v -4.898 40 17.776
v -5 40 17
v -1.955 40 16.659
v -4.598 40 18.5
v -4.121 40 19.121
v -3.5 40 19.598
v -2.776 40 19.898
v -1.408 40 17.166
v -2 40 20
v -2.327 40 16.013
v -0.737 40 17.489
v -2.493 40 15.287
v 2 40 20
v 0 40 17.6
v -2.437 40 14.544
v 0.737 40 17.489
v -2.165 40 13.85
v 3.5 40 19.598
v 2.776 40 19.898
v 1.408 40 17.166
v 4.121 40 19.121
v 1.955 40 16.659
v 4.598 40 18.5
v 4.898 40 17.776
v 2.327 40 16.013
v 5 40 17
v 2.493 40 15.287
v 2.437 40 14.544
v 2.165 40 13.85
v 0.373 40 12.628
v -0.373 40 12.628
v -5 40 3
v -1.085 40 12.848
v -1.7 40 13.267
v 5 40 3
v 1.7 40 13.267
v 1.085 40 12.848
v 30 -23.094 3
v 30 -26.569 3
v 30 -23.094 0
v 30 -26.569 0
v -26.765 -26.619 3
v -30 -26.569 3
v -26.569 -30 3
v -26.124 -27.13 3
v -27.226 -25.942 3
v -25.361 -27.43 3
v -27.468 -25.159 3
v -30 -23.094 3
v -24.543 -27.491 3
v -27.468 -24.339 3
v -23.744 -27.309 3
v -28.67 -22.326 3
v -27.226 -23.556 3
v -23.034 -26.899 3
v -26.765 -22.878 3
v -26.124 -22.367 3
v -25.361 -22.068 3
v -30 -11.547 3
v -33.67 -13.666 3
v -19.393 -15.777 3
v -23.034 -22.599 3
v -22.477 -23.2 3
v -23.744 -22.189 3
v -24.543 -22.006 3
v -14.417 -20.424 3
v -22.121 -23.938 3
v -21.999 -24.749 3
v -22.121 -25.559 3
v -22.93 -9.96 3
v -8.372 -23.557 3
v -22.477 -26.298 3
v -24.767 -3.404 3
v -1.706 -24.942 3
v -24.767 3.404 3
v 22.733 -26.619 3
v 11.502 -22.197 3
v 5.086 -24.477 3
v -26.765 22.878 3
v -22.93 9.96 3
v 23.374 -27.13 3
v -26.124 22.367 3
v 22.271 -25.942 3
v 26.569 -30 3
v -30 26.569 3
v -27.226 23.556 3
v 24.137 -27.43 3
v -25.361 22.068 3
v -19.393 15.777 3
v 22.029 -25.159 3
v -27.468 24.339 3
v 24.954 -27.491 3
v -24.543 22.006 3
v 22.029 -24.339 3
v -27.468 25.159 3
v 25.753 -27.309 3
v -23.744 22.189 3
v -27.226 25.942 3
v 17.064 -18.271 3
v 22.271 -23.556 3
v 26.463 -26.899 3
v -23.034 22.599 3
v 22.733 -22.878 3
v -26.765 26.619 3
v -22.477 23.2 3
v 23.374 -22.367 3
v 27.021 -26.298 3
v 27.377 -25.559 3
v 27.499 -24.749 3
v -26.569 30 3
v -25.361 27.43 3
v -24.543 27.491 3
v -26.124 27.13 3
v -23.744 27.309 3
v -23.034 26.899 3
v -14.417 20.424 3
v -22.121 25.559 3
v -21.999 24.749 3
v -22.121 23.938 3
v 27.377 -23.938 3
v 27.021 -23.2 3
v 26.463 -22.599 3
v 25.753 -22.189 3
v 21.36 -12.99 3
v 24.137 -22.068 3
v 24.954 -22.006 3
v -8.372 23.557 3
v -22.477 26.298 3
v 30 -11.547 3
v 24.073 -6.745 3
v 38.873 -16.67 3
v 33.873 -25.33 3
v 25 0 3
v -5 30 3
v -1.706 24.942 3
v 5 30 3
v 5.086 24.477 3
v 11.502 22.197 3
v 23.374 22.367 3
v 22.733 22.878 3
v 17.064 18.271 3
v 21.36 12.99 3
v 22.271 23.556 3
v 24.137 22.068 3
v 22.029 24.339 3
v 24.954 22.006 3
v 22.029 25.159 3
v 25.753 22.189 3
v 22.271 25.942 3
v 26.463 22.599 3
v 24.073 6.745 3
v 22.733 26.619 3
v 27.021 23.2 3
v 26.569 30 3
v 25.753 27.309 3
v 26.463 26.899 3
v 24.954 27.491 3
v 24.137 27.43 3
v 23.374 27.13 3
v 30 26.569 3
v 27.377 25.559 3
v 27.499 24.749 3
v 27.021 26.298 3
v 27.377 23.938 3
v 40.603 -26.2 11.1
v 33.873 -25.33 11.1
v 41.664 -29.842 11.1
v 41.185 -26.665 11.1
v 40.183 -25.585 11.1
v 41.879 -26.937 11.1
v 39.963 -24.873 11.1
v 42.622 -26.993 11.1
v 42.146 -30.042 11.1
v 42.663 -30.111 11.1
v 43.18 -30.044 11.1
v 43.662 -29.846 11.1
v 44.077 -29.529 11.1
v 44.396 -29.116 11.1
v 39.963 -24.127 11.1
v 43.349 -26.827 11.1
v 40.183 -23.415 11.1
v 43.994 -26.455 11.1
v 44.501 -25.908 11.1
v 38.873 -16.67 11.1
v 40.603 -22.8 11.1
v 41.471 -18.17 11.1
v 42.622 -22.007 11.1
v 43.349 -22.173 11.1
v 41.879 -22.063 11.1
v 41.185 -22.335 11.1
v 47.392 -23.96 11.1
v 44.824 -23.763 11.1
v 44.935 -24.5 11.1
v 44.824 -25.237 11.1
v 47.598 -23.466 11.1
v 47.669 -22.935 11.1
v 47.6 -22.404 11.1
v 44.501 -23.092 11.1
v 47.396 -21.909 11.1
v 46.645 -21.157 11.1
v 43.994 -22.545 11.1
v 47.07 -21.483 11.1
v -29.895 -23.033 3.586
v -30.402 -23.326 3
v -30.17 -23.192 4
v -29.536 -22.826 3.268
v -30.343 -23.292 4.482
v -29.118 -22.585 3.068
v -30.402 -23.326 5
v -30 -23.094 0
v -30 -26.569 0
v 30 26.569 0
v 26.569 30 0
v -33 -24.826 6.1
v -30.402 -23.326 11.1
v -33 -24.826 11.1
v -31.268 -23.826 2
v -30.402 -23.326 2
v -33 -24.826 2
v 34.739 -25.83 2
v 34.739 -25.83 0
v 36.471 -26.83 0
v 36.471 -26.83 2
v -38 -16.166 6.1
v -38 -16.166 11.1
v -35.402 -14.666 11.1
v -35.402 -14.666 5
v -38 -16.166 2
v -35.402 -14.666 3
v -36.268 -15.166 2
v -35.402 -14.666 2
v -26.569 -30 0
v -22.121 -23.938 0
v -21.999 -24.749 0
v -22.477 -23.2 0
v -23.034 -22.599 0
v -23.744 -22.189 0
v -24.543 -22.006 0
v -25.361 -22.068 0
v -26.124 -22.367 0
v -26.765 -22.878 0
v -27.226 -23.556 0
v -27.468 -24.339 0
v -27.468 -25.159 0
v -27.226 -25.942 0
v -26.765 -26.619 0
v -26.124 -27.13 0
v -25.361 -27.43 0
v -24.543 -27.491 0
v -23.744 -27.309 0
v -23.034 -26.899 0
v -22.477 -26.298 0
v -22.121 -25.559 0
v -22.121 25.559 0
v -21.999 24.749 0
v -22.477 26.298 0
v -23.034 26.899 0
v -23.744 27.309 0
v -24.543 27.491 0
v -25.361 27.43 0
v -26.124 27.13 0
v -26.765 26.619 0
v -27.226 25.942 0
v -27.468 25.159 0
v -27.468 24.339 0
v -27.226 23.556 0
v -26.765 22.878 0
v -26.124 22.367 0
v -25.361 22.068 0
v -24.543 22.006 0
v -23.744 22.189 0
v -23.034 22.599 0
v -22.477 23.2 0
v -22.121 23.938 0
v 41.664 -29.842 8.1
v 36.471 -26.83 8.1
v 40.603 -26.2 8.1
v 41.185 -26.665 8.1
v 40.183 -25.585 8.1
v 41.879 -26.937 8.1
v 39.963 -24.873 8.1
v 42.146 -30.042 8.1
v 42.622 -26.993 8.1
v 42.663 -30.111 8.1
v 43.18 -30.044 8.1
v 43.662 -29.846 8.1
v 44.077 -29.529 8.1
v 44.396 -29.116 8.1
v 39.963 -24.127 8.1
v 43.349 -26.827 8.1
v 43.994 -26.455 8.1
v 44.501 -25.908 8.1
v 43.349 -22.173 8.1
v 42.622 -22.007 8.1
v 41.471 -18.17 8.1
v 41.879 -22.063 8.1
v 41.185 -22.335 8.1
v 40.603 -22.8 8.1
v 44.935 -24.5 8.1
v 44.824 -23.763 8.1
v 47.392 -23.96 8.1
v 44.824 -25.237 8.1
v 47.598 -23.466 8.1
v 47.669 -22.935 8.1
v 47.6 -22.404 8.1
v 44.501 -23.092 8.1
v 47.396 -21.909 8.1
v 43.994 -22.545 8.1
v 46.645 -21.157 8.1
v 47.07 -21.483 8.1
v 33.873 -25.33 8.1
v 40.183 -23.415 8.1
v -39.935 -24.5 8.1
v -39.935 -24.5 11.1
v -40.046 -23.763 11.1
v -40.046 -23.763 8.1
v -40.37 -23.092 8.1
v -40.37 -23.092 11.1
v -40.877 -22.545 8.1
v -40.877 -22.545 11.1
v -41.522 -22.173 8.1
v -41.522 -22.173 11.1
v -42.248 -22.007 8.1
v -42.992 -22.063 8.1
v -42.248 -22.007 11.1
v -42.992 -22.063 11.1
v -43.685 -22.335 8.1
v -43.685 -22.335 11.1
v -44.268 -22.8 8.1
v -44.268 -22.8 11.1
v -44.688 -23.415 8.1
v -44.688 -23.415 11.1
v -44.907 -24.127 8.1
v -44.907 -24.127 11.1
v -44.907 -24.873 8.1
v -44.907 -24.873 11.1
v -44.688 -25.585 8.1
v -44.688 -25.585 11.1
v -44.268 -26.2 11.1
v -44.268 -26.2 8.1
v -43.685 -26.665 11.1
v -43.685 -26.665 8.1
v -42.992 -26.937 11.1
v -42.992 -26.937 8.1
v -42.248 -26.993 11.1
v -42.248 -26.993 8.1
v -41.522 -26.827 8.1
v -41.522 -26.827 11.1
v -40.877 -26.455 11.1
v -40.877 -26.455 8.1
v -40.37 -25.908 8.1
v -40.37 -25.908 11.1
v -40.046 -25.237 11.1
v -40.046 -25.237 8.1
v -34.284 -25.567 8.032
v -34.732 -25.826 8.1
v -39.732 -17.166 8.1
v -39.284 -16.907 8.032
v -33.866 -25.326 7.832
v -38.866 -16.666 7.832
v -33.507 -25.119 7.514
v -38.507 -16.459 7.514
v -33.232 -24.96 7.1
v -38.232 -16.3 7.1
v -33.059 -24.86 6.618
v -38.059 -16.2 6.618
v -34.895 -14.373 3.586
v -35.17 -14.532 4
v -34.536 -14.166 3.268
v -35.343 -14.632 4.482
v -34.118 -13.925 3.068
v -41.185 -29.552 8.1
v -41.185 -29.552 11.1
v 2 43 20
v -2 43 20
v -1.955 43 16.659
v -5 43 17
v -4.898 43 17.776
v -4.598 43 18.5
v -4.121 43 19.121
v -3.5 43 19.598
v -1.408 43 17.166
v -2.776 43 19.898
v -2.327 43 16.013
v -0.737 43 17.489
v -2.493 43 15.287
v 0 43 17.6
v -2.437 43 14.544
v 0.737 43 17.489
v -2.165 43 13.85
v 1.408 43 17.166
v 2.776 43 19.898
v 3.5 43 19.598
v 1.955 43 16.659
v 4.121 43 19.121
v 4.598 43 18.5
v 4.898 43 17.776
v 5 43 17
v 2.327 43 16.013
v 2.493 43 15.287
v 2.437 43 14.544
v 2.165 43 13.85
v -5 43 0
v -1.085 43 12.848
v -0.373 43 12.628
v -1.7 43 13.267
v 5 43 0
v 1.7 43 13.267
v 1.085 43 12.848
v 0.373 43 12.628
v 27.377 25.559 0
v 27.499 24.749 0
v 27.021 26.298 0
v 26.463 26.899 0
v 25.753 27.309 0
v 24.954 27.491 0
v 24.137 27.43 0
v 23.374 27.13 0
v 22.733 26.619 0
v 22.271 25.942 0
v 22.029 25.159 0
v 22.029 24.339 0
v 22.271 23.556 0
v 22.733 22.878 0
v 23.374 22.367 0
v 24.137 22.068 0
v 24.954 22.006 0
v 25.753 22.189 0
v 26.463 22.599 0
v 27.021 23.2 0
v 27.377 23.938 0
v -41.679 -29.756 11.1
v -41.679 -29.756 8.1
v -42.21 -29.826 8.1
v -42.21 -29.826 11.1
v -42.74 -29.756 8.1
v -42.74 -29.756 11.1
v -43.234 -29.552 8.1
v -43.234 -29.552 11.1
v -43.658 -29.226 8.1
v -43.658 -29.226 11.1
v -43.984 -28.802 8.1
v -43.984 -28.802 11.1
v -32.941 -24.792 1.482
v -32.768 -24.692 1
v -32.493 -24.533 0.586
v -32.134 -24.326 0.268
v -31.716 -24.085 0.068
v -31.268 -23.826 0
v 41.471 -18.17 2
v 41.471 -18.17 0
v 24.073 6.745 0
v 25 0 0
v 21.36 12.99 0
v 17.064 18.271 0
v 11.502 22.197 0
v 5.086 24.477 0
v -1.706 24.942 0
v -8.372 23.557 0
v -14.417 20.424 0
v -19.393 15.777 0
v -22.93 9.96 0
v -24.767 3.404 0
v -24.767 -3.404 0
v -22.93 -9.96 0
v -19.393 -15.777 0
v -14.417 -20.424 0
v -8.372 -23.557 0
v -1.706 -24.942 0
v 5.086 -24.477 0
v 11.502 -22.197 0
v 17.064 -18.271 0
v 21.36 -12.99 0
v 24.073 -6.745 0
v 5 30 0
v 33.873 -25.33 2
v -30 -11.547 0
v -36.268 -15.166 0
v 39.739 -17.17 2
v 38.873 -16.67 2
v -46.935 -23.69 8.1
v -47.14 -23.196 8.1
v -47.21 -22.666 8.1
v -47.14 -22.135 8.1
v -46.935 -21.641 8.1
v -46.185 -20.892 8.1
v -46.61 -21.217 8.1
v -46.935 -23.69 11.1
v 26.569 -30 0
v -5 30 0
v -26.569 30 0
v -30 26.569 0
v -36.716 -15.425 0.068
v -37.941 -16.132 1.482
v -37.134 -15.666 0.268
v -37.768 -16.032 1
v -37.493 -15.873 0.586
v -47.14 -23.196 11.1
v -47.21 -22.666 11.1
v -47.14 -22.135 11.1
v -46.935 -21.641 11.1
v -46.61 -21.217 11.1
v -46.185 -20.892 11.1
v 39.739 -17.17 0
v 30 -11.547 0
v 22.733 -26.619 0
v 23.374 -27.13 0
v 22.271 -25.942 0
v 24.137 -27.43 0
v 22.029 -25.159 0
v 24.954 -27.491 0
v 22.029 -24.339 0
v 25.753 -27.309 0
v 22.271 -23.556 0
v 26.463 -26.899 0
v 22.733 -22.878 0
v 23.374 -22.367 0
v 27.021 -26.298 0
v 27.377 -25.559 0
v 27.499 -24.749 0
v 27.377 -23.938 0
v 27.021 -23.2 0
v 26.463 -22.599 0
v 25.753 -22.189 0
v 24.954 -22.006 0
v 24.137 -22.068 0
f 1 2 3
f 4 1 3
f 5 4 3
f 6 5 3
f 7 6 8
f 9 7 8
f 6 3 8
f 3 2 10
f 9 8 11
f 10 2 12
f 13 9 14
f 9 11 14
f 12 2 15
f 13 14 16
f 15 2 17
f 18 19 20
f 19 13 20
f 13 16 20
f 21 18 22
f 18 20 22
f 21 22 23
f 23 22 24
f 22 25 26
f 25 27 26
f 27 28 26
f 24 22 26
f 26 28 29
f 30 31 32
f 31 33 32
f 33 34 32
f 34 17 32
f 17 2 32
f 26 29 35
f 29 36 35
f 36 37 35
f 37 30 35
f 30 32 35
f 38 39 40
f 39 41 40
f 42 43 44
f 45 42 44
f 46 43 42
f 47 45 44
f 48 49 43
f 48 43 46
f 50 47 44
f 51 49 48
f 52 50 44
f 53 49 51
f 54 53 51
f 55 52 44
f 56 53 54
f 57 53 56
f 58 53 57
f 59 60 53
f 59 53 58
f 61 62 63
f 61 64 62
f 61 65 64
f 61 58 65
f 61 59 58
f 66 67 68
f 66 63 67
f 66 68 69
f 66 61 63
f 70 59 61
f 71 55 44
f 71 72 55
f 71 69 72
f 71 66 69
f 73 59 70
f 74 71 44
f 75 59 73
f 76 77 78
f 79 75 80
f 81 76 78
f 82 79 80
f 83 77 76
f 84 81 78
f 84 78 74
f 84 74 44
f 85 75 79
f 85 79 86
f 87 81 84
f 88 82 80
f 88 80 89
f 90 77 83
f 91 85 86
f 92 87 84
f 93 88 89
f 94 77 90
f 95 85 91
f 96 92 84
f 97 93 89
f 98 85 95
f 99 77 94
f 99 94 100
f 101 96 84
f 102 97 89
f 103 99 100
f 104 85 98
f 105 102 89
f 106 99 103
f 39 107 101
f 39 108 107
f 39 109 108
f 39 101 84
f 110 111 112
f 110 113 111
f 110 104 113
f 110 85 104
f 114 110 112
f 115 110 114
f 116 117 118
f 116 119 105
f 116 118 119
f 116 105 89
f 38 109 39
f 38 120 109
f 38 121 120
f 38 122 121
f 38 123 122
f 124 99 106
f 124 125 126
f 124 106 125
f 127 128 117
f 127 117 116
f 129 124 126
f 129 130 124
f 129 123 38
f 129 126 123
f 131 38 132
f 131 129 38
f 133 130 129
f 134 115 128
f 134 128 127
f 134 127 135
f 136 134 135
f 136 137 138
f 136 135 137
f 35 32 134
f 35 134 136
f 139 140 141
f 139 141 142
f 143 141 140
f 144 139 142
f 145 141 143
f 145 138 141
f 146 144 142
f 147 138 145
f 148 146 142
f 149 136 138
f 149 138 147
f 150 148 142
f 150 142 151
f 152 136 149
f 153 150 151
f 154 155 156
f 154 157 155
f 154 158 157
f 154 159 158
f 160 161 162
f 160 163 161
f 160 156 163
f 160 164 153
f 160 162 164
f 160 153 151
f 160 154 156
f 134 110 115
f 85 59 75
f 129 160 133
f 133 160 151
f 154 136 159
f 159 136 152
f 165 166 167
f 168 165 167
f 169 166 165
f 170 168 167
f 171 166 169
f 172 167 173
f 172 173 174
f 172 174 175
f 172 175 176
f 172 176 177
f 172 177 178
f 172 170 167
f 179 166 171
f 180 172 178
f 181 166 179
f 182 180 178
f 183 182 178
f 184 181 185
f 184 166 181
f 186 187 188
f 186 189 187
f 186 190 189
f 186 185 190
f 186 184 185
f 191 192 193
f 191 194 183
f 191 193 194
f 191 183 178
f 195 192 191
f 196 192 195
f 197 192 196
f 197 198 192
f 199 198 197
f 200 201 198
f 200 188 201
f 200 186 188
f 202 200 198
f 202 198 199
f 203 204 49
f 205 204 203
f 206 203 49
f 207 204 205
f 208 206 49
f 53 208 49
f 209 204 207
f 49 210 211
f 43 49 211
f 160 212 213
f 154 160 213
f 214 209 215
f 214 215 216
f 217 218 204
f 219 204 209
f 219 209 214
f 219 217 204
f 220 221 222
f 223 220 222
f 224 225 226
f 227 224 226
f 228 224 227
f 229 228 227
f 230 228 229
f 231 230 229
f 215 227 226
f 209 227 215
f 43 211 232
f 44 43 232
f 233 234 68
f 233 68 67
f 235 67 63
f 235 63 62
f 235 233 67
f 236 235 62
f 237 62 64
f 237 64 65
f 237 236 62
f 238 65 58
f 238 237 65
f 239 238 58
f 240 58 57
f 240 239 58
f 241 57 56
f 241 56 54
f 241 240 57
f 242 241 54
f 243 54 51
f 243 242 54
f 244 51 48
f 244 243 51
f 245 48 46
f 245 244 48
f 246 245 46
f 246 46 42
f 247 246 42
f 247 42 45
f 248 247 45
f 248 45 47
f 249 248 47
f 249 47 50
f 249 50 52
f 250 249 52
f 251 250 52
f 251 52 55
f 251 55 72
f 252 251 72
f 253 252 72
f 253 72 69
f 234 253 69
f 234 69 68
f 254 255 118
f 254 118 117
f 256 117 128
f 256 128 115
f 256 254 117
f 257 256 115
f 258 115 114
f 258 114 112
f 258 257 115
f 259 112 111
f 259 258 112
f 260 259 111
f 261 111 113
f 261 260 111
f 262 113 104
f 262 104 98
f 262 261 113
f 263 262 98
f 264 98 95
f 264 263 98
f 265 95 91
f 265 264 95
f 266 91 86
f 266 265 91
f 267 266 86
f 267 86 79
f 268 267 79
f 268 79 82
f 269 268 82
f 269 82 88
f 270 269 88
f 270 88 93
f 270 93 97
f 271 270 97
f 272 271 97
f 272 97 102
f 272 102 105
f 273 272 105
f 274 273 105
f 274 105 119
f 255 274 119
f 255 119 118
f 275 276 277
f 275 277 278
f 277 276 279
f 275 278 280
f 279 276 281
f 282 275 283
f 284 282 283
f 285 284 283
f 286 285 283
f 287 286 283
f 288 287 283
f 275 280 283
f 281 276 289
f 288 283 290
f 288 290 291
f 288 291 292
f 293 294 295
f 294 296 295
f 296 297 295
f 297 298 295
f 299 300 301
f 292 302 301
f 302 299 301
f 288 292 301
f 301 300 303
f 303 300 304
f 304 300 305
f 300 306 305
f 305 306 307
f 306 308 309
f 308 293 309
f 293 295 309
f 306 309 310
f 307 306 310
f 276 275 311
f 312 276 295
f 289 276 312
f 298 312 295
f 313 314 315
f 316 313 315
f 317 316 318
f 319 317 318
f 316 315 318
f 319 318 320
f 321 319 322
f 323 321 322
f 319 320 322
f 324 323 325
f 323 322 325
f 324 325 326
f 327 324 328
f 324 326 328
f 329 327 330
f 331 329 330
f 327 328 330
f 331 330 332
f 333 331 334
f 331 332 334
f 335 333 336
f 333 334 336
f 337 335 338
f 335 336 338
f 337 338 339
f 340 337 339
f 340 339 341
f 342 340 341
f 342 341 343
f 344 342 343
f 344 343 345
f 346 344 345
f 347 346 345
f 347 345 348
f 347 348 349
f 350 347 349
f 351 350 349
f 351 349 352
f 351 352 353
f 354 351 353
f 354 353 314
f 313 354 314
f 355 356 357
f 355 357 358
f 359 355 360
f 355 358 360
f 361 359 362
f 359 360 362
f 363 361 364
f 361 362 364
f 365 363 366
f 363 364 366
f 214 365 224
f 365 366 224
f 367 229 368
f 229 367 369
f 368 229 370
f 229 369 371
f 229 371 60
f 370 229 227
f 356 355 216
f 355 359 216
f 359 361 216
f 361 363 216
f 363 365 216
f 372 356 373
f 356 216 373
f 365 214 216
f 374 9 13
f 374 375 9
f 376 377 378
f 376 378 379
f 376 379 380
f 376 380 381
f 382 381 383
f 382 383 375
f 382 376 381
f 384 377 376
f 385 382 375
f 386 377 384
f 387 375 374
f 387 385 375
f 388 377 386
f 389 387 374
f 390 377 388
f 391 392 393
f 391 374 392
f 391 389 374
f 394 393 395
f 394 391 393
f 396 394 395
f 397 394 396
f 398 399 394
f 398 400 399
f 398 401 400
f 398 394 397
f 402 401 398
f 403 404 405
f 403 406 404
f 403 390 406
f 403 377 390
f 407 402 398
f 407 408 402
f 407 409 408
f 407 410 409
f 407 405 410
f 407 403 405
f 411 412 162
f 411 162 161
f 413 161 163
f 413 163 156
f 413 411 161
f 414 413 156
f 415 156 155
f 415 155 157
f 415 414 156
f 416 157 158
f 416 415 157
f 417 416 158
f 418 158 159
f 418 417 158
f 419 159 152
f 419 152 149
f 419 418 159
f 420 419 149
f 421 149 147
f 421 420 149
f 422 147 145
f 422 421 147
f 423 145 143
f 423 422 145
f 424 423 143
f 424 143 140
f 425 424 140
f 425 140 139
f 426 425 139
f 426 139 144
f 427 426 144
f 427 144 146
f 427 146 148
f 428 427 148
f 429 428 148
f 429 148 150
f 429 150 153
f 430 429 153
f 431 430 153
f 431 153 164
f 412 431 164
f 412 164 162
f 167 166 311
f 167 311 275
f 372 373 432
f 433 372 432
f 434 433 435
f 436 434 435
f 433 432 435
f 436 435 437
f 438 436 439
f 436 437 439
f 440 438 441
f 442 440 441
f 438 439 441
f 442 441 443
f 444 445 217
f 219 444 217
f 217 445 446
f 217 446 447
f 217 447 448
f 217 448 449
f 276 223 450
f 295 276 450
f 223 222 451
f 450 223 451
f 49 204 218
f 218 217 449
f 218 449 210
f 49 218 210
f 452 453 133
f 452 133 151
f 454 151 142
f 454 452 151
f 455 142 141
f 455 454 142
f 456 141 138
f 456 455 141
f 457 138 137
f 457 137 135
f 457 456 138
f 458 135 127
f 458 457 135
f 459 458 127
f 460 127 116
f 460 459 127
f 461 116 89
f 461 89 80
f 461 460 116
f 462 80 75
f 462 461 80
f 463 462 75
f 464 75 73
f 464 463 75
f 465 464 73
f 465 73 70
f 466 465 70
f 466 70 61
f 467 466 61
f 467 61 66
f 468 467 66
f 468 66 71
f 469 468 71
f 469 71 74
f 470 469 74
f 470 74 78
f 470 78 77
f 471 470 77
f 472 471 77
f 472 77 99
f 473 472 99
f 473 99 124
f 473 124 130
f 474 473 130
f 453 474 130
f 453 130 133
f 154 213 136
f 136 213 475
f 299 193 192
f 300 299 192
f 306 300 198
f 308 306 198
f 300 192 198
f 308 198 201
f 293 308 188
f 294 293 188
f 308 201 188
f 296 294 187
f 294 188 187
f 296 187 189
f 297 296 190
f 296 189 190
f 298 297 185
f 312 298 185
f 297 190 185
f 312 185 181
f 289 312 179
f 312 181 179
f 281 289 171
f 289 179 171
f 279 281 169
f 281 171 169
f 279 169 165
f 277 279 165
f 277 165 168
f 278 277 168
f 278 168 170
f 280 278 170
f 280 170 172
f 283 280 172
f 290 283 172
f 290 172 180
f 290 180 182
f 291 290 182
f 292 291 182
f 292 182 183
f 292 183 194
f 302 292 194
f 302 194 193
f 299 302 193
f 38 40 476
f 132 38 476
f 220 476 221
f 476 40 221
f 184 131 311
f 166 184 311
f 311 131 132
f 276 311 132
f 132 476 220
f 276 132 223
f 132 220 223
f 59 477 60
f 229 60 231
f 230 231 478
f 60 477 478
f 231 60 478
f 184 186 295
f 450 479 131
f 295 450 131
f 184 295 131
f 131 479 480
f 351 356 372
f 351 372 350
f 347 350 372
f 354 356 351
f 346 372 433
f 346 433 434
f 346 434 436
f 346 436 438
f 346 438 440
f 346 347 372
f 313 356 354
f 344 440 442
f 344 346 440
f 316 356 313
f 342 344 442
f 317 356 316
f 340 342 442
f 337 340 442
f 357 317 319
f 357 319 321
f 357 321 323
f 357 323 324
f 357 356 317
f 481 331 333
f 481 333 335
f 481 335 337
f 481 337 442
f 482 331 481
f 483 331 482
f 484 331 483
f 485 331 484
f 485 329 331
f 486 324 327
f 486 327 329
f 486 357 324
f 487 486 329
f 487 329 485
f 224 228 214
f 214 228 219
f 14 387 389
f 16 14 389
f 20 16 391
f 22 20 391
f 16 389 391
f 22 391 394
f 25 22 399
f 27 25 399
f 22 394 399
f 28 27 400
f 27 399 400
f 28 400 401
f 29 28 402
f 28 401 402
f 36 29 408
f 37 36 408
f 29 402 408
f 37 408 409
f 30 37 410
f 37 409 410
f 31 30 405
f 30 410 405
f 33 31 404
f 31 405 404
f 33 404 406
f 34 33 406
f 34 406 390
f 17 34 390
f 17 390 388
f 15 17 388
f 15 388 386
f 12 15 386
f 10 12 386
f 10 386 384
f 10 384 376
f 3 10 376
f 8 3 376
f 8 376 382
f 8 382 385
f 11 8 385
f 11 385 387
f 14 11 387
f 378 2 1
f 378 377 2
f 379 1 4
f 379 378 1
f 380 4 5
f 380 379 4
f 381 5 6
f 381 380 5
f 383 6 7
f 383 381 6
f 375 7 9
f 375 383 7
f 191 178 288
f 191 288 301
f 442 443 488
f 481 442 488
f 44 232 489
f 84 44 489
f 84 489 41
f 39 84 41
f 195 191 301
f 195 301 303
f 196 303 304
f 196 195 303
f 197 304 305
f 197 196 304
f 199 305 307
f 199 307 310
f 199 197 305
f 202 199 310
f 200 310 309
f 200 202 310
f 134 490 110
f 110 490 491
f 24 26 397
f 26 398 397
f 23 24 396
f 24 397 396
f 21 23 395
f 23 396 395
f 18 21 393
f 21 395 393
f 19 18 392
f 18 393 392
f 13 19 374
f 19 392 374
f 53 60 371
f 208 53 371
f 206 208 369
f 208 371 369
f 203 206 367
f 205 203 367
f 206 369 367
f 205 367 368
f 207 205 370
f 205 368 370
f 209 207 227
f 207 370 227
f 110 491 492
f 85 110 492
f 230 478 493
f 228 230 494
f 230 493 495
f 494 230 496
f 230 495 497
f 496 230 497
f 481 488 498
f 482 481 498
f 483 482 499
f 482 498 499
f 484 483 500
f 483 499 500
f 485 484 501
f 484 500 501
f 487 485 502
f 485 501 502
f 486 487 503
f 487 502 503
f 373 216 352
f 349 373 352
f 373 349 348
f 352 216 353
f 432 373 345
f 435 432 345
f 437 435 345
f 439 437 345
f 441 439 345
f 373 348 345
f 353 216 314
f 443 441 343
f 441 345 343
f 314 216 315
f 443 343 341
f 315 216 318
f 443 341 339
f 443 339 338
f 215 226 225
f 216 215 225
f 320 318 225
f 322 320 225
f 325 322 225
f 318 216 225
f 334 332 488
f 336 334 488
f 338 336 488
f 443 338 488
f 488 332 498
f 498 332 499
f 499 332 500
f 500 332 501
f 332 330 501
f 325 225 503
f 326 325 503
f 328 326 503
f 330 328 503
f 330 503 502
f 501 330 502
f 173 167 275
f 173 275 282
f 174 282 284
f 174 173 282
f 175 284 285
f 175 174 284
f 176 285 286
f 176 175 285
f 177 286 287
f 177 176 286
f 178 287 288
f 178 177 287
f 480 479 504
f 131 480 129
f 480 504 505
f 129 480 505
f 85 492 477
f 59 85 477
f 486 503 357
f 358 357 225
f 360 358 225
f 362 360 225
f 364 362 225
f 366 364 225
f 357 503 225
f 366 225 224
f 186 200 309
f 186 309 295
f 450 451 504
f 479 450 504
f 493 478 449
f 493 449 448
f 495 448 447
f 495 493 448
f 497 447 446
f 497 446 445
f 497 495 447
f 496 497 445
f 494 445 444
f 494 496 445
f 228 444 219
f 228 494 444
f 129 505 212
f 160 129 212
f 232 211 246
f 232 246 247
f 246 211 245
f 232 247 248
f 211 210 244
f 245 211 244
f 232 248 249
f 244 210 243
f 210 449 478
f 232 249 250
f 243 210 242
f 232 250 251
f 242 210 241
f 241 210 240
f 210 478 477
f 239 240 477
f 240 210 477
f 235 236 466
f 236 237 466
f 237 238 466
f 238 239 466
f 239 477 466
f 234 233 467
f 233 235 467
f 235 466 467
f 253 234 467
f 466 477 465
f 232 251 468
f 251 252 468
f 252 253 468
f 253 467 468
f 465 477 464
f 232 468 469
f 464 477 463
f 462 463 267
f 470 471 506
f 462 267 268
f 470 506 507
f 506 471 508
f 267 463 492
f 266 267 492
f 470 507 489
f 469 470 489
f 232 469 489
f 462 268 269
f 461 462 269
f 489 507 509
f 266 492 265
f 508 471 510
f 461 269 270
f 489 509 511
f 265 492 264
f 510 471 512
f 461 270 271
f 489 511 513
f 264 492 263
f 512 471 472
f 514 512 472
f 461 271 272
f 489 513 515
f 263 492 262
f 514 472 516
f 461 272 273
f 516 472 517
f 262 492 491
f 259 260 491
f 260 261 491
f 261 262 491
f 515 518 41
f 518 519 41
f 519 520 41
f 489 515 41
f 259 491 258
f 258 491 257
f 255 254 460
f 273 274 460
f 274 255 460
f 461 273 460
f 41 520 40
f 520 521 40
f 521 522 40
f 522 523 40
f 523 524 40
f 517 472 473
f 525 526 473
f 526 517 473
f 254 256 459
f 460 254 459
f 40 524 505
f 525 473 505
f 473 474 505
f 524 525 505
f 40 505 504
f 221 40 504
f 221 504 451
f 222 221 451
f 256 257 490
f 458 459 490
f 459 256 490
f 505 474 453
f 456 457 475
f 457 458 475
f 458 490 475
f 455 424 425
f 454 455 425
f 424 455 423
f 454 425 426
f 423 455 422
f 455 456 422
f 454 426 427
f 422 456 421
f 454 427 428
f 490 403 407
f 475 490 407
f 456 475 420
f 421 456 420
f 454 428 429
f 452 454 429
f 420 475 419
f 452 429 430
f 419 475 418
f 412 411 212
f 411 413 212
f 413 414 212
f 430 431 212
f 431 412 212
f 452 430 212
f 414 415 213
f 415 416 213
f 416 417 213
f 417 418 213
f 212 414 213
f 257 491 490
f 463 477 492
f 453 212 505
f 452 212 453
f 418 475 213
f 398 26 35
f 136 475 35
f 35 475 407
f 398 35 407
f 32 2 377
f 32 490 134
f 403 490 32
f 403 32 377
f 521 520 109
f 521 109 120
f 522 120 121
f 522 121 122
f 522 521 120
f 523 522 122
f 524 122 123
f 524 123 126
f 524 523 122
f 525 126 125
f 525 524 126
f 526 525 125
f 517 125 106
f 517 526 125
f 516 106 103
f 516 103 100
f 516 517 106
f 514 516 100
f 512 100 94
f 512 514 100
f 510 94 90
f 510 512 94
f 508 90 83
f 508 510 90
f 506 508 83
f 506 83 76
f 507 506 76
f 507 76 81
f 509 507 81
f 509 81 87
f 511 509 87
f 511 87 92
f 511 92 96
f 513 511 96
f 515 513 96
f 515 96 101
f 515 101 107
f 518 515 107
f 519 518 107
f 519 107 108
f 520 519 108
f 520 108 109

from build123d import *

# Parameters (mm, degrees)
SKETCH1_R           = 2.75
SKETCH1_R_2         = 25
SKETCH1_W           = 10
SKETCH1_H           = 11
SKETCH1_H_2         = 2
BOSS_EXTRUDE1_DEPTH = 2
SKETCH5_W           = 10
SKETCH5_H           = 3
BOSS_EXTRUDE2_DEPTH = 9.1
BOSS_EXTRUDE5_DEPTH = 3
SKETCH5_2_W         = 10
SKETCH5_2_H         = 3
BOSS_EXTRUDE6_DEPTH = 18
SKETCH7_R           = 2.5
CUT_EXTRUDE1_DEPTH  = 10
SKETCH1_4_R         = 2.75
SKETCH1_4_R_2       = 25
BOSS_EXTRUDE7_DEPTH = 3
SKETCH1_5_W         = 10
SKETCH1_5_H         = 11
BOSS_EXTRUDE8_DEPTH = 3
FILLET5_R           = 2
SKETCH10_R          = 2.5
CUT_EXTRUDE2_DEPTH  = 4
FILLET6_R           = 3
FILLET7_START       = -5
FILLET7_DEPTH       = 10
FILLET7_2_DEPTH     = 10


with BuildPart() as part:
    # Sketch1 → Boss-Extrude1 (new body)
    # profile 1 of 7: a face of its own
    with BuildSketch(Plane.XY):
        Polygon((26.568542495, 30), (-26.568542495, 30), (-30, 26.568542495), (-30, -26.568542495), (-26.568542495, -30), (26.568542495, -30), (30, -26.568542495), (30, 26.568542495), align=None)
        with Locations((-24.748737342, -24.748737342)):
            Circle(SKETCH1_R, mode=Mode.SUBTRACT)
        with Locations((24.748737342, -24.748737342)):
            Circle(SKETCH1_R, mode=Mode.SUBTRACT)
        with Locations((24.748737342, 24.748737342)):
            Circle(SKETCH1_R, mode=Mode.SUBTRACT)
        with Locations((-24.748737342, 24.748737342)):
            Circle(SKETCH1_R, mode=Mode.SUBTRACT)
        Circle(SKETCH1_R_2, mode=Mode.SUBTRACT)
    # profile 2 of 7: a face of its own
    with BuildSketch(Plane.XY):
        Polygon((-30, -23.094010768), (-30, -11.547005384), (-36.267949192, -15.165807537), (-31.267949192, -23.826061575), align=None)
    # profile 3 of 7: a face of its own
    with BuildSketch(Plane.XY):
        with Locations((0, 35.5)):
            Rectangle(SKETCH1_W, SKETCH1_H)
    # profile 4 of 7: a face of its own
    with BuildSketch(Plane.XY):
        Polygon((39.739092363, -17.169872981), (30, -11.547005384), (30, -23.094010768), (34.739092363, -25.830127019), align=None)
    # profile 5 of 7: a face of its own
    with BuildSketch(Plane.XY):
        Polygon((41.47114317, -18.169872981), (39.739092363, -17.169872981), (34.739092363, -25.830127019), (36.47114317, -26.830127019), align=None)
    # profile 6 of 7: a face of its own
    with BuildSketch(Plane.XY):
        with Locations((0, 42)):
            Rectangle(SKETCH1_W, SKETCH1_H_2)
    # profile 7 of 7: a face of its own
    with BuildSketch(Plane.XY):
        Polygon((-31.267949192, -23.826061575), (-36.267949192, -15.165807537), (-38, -16.165807537), (-33, -24.826061575), align=None)
    extrude(amount=BOSS_EXTRUDE1_DEPTH)

    # Sketch5 → Boss-Extrude2 (add)
    with BuildSketch(Plane.XY.offset(2)):
        with Locations((0, 41.5)):
            Rectangle(SKETCH5_W, SKETCH5_H)
        Polygon((-38, -16.165807537), (-35.401923789, -14.665807537), (-30.401923789, -23.326061575), (-33, -24.826061575), align=None)
        Polygon((41.47114317, -18.169872981), (38.873066959, -16.669872981), (33.873066959, -25.330127019), (36.47114317, -26.830127019), align=None)
    extrude(amount=BOSS_EXTRUDE2_DEPTH)

    # Sketch6 → Boss-Extrude5 (add)
    with BuildSketch(Plane.XY.offset(11.1)):
        with BuildLine():
            Line((-46.185292351, -20.891588279), (-35.401923789, -14.665807537))
            Line((-35.401923789, -14.665807537), (-30.401923789, -23.326061575))
            Line((-30.401923789, -23.326061575), (-41.185292351, -29.551842317))
            ThreePointArc((-41.185292351, -29.551842317), (-42.739686509, -29.75648219), (-43.983511401, -28.802061782))
            Line((-43.983511401, -28.802061782), (-46.935072886, -23.68980733))
            ThreePointArc((-46.935072886, -23.68980733), (-47.139712759, -22.135413172), (-46.185292351, -20.891588279))
        make_face()
        with BuildLine():
            Line((38.897920412, -16.684222129), (33.873066959, -25.330127019))
            Line((33.873066959, -25.330127019), (41.664082648, -29.84192454))
            ThreePointArc((41.664082648, -29.84192454), (43.179952831, -30.044118571), (44.395530273, -29.116155036))
            Line((44.395530273, -29.116155036), (47.391974814, -23.960387856))
            ThreePointArc((47.391974814, -23.960387856), (47.600320032, -22.403746576), (46.645140907, -21.157081967))
            Line((46.645140907, -21.157081967), (38.897920412, -16.684222129))
        make_face()
    extrude(amount=-BOSS_EXTRUDE5_DEPTH)

    # Sketch5<2> → Boss-Extrude6 (add)
    with BuildSketch(Plane.XY.offset(2)):
        with Locations((0, 41.5)):
            Rectangle(SKETCH5_2_W, SKETCH5_2_H)
    extrude(amount=BOSS_EXTRUDE6_DEPTH)

    # Sketch7 → Cut-Extrude1 (cut)
    with BuildSketch(Plane(origin=(0, 43, 0), x_dir=(1, 0, 0), z_dir=(0, 1, 0))):
        with Locations(Location((0, -15.1, 0), (0, 0, 270))):
            Circle(SKETCH7_R)
    extrude(amount=-CUT_EXTRUDE1_DEPTH, mode=Mode.SUBTRACT)

    # Sketch1<4> → Boss-Extrude7 (add)
    with BuildSketch(Plane.XY):
        Polygon((26.568542495, 30), (-26.568542495, 30), (-30, 26.568542495), (-30, -26.568542495), (-26.568542495, -30), (26.568542495, -30), (30, -26.568542495), (30, 26.568542495), align=None)
        with Locations((-24.748737342, -24.748737342)):
            Circle(SKETCH1_4_R, mode=Mode.SUBTRACT)
        with Locations((24.748737342, -24.748737342)):
            Circle(SKETCH1_4_R, mode=Mode.SUBTRACT)
        with Locations((24.748737342, 24.748737342)):
            Circle(SKETCH1_4_R, mode=Mode.SUBTRACT)
        with Locations((-24.748737342, 24.748737342)):
            Circle(SKETCH1_4_R, mode=Mode.SUBTRACT)
        Circle(SKETCH1_4_R_2, mode=Mode.SUBTRACT)
    extrude(amount=BOSS_EXTRUDE7_DEPTH)

    # Sketch1<5> → Boss-Extrude8 (add)
    with BuildSketch(Plane.XY):
        with Locations((0, 35.5)):
            Rectangle(SKETCH1_5_W, SKETCH1_5_H)
        Polygon((-30, -23.094010768), (-30, -11.547005384), (-36.267949192, -15.165807537), (-31.267949192, -23.826061575), align=None)
        Polygon((39.739092363, -17.169872981), (30, -11.547005384), (30, -23.094010768), (34.739092363, -25.830127019), align=None)
    extrude(amount=BOSS_EXTRUDE8_DEPTH)

    # Fillet5
    fillet5_edges = [part.edges().sort_by_distance(p)[0] for p in [
        (-35.5, -20.495934556, 8.1),
    ]]
    fillet(fillet5_edges, radius=FILLET5_R)

    # Sketch10 → Cut-Extrude2 (cut)
    with BuildSketch(Plane.XY.offset(11.1)):
        with Locations((42.435244785, -24.5)):
            Circle(SKETCH10_R)
        with Locations((-42.435244785, -24.5)):
            Circle(SKETCH10_R)
    extrude(amount=-CUT_EXTRUDE2_DEPTH, mode=Mode.SUBTRACT)

    # Fillet6
    fillet6_edges = [part.edges().sort_by_distance(p)[0] for p in [
        (-5, 41.5, 20),
        (5, 41.5, 20),
    ]]
    fillet(fillet6_edges, radius=FILLET6_R)

    # Fillet7: read off the stored shape, not the designer's step
    # Fillet7 outline → Fillet7 (cut)
    with BuildSketch(Plane(origin=(0, 0, 0), x_dir=(0.8660254037844398, 0.499999999999998, 0), z_dir=(0.49999999999999795, -0.8660254037844399, 0)).offset(FILLET7_START)):
        with BuildLine():
            ThreePointArc((-38.991869112, 0), (-40.406082675, 0.585786438), (-40.991869112, 2))
            Line((-40.991869112, 2), (-40.991869112, 0))
            Line((-40.991869112, 0), (-38.991869112, 0))
        make_face()
    extrude(amount=FILLET7_DEPTH, mode=Mode.SUBTRACT)

    # Fillet7 2 outline → Fillet7 2 (add)
    with BuildSketch(Plane(origin=(0, 0, 0), x_dir=(0.8660254037844398, 0.499999999999998, 0), z_dir=(0.49999999999999795, -0.8660254037844399, 0)).offset(FILLET7_START)):
        with BuildLine():
            Line((-37.991869112, 3), (-35.991869112, 3))
            ThreePointArc((-35.991869112, 3), (-37.406082675, 3.585786438), (-37.991869112, 5))
            Line((-37.991869112, 5), (-37.991869112, 3))
        make_face()
    extrude(amount=FILLET7_2_DEPTH)


solid = part.part
